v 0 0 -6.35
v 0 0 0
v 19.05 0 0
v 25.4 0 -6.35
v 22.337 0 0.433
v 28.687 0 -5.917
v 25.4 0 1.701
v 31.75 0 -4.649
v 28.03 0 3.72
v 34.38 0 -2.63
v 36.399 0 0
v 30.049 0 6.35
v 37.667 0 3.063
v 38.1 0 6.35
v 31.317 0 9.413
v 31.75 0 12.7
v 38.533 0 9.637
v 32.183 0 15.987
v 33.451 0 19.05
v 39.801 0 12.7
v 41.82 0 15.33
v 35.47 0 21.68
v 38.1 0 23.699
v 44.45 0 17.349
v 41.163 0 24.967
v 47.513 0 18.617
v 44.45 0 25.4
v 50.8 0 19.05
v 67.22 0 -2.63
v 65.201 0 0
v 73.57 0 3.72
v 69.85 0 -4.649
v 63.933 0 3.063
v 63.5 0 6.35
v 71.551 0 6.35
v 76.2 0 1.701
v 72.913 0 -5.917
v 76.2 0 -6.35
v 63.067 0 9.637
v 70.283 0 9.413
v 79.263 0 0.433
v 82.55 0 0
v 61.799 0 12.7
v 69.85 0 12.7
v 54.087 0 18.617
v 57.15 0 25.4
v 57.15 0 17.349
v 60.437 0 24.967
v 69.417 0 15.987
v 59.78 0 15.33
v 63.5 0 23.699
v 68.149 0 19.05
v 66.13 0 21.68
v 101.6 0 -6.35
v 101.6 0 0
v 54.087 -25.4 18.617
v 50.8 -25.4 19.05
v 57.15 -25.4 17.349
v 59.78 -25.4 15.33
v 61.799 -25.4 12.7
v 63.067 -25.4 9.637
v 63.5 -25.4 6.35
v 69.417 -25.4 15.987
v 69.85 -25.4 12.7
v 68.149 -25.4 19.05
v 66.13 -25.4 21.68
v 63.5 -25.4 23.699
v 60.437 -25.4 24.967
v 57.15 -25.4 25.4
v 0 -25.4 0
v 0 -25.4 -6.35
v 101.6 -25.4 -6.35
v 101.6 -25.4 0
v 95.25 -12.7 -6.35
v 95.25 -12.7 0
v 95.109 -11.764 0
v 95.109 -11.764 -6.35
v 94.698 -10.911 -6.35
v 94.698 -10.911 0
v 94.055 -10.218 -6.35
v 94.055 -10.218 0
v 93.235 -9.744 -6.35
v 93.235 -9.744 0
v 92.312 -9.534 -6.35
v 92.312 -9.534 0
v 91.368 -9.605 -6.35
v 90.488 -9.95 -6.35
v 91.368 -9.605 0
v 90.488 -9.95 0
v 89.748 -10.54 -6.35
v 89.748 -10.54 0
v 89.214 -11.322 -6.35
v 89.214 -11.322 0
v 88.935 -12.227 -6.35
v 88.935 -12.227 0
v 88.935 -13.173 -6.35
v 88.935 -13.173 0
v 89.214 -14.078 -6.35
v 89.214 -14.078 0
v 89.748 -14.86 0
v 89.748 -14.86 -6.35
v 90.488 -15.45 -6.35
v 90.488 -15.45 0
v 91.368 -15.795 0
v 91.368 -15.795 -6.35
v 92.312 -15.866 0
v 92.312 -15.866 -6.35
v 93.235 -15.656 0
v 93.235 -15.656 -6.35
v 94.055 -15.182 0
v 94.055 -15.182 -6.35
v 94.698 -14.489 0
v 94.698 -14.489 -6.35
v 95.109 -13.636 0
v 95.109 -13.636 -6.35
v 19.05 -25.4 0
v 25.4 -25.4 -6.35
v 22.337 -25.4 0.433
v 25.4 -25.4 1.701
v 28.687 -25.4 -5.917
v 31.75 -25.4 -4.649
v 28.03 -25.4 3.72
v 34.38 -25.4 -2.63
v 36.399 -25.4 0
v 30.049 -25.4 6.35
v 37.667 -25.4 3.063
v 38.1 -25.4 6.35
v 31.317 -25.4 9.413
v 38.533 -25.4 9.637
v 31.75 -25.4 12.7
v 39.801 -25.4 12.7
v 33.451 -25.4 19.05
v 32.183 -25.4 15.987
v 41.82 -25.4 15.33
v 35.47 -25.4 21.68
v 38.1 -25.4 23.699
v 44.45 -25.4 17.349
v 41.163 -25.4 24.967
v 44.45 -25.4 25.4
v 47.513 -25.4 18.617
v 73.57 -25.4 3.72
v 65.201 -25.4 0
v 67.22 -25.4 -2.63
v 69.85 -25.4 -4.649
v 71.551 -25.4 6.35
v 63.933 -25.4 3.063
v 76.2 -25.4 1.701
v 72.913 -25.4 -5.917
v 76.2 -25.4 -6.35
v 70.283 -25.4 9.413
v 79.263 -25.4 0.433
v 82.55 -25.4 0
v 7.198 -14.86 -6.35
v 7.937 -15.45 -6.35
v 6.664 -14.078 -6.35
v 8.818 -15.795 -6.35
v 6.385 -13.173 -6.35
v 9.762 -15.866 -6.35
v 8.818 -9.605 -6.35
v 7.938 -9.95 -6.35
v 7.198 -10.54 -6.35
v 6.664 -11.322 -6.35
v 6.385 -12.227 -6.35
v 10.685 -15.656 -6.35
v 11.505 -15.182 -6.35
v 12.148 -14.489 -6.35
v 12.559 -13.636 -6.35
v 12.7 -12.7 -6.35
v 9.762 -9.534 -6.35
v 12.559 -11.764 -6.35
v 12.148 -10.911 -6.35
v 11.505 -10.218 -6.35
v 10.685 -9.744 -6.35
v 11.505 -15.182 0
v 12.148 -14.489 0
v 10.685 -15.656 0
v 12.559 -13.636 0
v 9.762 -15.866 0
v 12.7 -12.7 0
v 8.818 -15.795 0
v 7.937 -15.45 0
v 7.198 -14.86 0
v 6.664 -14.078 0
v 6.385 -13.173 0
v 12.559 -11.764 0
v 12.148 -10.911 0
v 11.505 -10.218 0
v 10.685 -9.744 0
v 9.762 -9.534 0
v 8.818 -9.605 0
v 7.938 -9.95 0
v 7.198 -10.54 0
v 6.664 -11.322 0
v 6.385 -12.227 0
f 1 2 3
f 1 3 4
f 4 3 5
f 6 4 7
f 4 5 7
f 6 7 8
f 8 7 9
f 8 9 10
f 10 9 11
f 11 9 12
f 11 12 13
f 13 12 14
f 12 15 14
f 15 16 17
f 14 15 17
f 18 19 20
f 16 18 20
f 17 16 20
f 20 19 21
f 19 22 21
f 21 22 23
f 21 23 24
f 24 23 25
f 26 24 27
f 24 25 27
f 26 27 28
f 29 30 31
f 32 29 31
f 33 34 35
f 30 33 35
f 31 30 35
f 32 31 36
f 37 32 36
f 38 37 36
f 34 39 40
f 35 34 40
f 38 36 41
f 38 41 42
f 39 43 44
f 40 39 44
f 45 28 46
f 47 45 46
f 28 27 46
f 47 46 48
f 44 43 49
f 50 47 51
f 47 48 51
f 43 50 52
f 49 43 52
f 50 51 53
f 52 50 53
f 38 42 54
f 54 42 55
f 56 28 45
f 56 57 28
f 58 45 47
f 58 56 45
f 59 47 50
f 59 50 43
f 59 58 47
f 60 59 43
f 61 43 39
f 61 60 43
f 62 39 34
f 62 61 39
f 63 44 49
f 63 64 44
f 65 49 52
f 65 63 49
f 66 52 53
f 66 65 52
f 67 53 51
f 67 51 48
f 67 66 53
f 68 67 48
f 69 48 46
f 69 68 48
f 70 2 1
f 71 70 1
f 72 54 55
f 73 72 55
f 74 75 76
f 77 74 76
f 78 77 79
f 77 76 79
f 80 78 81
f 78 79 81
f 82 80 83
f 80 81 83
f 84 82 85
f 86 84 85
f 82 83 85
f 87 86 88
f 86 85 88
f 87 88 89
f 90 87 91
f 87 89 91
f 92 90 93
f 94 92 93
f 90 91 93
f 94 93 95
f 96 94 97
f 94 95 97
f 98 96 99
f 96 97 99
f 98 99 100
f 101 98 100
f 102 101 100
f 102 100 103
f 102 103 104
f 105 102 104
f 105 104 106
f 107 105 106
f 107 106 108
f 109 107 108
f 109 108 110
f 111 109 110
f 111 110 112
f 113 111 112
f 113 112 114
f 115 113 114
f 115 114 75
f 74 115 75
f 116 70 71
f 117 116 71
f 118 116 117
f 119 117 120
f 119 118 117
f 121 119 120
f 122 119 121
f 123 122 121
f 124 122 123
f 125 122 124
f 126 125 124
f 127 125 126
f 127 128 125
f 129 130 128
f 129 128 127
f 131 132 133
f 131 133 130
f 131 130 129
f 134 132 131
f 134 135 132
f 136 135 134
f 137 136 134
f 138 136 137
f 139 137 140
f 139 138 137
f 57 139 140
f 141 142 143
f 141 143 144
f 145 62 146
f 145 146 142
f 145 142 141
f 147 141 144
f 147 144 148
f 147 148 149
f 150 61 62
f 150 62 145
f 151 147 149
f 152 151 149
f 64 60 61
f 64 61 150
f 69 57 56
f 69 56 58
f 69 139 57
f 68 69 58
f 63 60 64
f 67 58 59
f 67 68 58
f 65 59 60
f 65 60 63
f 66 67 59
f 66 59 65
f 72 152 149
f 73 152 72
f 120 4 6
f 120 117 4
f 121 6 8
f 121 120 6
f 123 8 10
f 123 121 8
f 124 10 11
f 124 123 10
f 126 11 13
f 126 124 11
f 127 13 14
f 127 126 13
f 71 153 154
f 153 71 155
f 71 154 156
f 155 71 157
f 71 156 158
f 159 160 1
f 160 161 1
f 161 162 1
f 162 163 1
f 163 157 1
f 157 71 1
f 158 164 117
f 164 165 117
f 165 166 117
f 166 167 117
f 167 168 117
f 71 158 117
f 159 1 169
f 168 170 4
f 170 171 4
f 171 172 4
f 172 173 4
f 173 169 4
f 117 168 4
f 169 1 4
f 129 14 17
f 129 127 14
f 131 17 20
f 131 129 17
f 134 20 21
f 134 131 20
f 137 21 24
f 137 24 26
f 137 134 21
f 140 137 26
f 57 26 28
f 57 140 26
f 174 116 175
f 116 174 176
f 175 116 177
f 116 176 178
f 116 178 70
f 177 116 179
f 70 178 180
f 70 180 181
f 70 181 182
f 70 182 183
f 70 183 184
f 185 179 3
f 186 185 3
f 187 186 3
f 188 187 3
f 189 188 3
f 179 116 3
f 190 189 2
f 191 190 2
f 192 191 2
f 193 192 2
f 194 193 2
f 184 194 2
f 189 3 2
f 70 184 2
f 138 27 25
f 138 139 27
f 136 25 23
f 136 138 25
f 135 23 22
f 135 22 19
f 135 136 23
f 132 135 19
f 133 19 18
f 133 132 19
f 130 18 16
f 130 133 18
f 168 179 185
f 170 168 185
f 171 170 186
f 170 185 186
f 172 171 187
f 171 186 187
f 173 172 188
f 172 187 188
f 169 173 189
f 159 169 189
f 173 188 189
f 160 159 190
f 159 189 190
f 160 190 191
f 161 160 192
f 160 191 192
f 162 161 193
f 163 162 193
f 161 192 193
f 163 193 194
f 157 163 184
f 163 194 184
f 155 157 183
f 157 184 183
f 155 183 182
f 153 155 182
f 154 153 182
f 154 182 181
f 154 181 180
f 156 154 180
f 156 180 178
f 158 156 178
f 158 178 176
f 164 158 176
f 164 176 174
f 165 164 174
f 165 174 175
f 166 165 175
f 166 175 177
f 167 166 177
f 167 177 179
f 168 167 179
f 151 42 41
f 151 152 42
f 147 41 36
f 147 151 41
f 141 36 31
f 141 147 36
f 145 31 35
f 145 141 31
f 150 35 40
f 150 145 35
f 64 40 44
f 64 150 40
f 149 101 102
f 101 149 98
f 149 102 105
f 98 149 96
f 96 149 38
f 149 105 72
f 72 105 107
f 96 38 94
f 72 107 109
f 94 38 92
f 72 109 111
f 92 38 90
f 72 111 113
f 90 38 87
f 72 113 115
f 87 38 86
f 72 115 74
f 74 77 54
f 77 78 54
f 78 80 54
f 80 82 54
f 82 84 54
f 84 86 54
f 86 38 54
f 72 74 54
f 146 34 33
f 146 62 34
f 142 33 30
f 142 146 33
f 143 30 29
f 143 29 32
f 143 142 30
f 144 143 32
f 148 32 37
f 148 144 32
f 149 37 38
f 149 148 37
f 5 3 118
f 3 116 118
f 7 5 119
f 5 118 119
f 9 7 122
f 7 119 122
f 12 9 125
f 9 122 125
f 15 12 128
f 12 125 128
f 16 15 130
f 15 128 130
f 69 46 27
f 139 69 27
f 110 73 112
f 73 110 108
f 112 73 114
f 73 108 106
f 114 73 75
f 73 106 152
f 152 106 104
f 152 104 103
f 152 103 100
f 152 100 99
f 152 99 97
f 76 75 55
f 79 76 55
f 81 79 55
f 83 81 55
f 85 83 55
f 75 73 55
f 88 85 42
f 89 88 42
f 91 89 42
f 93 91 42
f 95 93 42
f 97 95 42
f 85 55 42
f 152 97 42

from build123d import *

# Parameters (mm, degrees)
F1_DEPTH = 25.4
F2_R     = 12.69999
F3_R     = 3.175
F4_DEPTH = 6.351


# Not quite as in the source:
# - a fillet or chamfer is up to 0.001 mm smaller than in the source, because OpenCascade refuses the exact size


with BuildPart() as f1:
    # F0 (on Front) → F1 (new body)
    with BuildSketch(Plane.XZ):
        Polygon((31.75, 0), (0, 0), (0, -6.35), (38.1, -6.35), (38.1, 19.05), (63.5, 19.05), (63.5, -6.35), (101.6, -6.35), (101.6, 0), (69.85, 0), (69.85, 25.4), (31.75, 25.4), align=None)
    extrude(amount=F1_DEPTH)

    # F2 (radius 12.7 in the source; OpenCascade refuses exactly that, so slightly less here)
    f2_edges = [f1.edges().sort_by_distance(p)[0] for p in [
        (31.75, -12.7, 25.4),
        (38.1, -12.7, 19.05),
        (69.85, -12.7, 25.4),
        (63.5, -12.7, 19.05),
        (63.5, -12.7, -6.35),
        (69.85, -12.7, 0),
        (38.1, -12.7, -6.35),
        (31.75, -12.7, 0),
    ]]
    fillet(f2_edges, radius=F2_R)

    # F3 (on face) → F4 (cut, through all)
    with BuildSketch(Plane.XY):
        with Locations((9.525, -12.7)):
            Circle(F3_R)
        with Locations((92.075, -12.7)):
            Circle(F3_R)
    extrude(amount=-F4_DEPTH, mode=Mode.SUBTRACT)


solid = f1.part
